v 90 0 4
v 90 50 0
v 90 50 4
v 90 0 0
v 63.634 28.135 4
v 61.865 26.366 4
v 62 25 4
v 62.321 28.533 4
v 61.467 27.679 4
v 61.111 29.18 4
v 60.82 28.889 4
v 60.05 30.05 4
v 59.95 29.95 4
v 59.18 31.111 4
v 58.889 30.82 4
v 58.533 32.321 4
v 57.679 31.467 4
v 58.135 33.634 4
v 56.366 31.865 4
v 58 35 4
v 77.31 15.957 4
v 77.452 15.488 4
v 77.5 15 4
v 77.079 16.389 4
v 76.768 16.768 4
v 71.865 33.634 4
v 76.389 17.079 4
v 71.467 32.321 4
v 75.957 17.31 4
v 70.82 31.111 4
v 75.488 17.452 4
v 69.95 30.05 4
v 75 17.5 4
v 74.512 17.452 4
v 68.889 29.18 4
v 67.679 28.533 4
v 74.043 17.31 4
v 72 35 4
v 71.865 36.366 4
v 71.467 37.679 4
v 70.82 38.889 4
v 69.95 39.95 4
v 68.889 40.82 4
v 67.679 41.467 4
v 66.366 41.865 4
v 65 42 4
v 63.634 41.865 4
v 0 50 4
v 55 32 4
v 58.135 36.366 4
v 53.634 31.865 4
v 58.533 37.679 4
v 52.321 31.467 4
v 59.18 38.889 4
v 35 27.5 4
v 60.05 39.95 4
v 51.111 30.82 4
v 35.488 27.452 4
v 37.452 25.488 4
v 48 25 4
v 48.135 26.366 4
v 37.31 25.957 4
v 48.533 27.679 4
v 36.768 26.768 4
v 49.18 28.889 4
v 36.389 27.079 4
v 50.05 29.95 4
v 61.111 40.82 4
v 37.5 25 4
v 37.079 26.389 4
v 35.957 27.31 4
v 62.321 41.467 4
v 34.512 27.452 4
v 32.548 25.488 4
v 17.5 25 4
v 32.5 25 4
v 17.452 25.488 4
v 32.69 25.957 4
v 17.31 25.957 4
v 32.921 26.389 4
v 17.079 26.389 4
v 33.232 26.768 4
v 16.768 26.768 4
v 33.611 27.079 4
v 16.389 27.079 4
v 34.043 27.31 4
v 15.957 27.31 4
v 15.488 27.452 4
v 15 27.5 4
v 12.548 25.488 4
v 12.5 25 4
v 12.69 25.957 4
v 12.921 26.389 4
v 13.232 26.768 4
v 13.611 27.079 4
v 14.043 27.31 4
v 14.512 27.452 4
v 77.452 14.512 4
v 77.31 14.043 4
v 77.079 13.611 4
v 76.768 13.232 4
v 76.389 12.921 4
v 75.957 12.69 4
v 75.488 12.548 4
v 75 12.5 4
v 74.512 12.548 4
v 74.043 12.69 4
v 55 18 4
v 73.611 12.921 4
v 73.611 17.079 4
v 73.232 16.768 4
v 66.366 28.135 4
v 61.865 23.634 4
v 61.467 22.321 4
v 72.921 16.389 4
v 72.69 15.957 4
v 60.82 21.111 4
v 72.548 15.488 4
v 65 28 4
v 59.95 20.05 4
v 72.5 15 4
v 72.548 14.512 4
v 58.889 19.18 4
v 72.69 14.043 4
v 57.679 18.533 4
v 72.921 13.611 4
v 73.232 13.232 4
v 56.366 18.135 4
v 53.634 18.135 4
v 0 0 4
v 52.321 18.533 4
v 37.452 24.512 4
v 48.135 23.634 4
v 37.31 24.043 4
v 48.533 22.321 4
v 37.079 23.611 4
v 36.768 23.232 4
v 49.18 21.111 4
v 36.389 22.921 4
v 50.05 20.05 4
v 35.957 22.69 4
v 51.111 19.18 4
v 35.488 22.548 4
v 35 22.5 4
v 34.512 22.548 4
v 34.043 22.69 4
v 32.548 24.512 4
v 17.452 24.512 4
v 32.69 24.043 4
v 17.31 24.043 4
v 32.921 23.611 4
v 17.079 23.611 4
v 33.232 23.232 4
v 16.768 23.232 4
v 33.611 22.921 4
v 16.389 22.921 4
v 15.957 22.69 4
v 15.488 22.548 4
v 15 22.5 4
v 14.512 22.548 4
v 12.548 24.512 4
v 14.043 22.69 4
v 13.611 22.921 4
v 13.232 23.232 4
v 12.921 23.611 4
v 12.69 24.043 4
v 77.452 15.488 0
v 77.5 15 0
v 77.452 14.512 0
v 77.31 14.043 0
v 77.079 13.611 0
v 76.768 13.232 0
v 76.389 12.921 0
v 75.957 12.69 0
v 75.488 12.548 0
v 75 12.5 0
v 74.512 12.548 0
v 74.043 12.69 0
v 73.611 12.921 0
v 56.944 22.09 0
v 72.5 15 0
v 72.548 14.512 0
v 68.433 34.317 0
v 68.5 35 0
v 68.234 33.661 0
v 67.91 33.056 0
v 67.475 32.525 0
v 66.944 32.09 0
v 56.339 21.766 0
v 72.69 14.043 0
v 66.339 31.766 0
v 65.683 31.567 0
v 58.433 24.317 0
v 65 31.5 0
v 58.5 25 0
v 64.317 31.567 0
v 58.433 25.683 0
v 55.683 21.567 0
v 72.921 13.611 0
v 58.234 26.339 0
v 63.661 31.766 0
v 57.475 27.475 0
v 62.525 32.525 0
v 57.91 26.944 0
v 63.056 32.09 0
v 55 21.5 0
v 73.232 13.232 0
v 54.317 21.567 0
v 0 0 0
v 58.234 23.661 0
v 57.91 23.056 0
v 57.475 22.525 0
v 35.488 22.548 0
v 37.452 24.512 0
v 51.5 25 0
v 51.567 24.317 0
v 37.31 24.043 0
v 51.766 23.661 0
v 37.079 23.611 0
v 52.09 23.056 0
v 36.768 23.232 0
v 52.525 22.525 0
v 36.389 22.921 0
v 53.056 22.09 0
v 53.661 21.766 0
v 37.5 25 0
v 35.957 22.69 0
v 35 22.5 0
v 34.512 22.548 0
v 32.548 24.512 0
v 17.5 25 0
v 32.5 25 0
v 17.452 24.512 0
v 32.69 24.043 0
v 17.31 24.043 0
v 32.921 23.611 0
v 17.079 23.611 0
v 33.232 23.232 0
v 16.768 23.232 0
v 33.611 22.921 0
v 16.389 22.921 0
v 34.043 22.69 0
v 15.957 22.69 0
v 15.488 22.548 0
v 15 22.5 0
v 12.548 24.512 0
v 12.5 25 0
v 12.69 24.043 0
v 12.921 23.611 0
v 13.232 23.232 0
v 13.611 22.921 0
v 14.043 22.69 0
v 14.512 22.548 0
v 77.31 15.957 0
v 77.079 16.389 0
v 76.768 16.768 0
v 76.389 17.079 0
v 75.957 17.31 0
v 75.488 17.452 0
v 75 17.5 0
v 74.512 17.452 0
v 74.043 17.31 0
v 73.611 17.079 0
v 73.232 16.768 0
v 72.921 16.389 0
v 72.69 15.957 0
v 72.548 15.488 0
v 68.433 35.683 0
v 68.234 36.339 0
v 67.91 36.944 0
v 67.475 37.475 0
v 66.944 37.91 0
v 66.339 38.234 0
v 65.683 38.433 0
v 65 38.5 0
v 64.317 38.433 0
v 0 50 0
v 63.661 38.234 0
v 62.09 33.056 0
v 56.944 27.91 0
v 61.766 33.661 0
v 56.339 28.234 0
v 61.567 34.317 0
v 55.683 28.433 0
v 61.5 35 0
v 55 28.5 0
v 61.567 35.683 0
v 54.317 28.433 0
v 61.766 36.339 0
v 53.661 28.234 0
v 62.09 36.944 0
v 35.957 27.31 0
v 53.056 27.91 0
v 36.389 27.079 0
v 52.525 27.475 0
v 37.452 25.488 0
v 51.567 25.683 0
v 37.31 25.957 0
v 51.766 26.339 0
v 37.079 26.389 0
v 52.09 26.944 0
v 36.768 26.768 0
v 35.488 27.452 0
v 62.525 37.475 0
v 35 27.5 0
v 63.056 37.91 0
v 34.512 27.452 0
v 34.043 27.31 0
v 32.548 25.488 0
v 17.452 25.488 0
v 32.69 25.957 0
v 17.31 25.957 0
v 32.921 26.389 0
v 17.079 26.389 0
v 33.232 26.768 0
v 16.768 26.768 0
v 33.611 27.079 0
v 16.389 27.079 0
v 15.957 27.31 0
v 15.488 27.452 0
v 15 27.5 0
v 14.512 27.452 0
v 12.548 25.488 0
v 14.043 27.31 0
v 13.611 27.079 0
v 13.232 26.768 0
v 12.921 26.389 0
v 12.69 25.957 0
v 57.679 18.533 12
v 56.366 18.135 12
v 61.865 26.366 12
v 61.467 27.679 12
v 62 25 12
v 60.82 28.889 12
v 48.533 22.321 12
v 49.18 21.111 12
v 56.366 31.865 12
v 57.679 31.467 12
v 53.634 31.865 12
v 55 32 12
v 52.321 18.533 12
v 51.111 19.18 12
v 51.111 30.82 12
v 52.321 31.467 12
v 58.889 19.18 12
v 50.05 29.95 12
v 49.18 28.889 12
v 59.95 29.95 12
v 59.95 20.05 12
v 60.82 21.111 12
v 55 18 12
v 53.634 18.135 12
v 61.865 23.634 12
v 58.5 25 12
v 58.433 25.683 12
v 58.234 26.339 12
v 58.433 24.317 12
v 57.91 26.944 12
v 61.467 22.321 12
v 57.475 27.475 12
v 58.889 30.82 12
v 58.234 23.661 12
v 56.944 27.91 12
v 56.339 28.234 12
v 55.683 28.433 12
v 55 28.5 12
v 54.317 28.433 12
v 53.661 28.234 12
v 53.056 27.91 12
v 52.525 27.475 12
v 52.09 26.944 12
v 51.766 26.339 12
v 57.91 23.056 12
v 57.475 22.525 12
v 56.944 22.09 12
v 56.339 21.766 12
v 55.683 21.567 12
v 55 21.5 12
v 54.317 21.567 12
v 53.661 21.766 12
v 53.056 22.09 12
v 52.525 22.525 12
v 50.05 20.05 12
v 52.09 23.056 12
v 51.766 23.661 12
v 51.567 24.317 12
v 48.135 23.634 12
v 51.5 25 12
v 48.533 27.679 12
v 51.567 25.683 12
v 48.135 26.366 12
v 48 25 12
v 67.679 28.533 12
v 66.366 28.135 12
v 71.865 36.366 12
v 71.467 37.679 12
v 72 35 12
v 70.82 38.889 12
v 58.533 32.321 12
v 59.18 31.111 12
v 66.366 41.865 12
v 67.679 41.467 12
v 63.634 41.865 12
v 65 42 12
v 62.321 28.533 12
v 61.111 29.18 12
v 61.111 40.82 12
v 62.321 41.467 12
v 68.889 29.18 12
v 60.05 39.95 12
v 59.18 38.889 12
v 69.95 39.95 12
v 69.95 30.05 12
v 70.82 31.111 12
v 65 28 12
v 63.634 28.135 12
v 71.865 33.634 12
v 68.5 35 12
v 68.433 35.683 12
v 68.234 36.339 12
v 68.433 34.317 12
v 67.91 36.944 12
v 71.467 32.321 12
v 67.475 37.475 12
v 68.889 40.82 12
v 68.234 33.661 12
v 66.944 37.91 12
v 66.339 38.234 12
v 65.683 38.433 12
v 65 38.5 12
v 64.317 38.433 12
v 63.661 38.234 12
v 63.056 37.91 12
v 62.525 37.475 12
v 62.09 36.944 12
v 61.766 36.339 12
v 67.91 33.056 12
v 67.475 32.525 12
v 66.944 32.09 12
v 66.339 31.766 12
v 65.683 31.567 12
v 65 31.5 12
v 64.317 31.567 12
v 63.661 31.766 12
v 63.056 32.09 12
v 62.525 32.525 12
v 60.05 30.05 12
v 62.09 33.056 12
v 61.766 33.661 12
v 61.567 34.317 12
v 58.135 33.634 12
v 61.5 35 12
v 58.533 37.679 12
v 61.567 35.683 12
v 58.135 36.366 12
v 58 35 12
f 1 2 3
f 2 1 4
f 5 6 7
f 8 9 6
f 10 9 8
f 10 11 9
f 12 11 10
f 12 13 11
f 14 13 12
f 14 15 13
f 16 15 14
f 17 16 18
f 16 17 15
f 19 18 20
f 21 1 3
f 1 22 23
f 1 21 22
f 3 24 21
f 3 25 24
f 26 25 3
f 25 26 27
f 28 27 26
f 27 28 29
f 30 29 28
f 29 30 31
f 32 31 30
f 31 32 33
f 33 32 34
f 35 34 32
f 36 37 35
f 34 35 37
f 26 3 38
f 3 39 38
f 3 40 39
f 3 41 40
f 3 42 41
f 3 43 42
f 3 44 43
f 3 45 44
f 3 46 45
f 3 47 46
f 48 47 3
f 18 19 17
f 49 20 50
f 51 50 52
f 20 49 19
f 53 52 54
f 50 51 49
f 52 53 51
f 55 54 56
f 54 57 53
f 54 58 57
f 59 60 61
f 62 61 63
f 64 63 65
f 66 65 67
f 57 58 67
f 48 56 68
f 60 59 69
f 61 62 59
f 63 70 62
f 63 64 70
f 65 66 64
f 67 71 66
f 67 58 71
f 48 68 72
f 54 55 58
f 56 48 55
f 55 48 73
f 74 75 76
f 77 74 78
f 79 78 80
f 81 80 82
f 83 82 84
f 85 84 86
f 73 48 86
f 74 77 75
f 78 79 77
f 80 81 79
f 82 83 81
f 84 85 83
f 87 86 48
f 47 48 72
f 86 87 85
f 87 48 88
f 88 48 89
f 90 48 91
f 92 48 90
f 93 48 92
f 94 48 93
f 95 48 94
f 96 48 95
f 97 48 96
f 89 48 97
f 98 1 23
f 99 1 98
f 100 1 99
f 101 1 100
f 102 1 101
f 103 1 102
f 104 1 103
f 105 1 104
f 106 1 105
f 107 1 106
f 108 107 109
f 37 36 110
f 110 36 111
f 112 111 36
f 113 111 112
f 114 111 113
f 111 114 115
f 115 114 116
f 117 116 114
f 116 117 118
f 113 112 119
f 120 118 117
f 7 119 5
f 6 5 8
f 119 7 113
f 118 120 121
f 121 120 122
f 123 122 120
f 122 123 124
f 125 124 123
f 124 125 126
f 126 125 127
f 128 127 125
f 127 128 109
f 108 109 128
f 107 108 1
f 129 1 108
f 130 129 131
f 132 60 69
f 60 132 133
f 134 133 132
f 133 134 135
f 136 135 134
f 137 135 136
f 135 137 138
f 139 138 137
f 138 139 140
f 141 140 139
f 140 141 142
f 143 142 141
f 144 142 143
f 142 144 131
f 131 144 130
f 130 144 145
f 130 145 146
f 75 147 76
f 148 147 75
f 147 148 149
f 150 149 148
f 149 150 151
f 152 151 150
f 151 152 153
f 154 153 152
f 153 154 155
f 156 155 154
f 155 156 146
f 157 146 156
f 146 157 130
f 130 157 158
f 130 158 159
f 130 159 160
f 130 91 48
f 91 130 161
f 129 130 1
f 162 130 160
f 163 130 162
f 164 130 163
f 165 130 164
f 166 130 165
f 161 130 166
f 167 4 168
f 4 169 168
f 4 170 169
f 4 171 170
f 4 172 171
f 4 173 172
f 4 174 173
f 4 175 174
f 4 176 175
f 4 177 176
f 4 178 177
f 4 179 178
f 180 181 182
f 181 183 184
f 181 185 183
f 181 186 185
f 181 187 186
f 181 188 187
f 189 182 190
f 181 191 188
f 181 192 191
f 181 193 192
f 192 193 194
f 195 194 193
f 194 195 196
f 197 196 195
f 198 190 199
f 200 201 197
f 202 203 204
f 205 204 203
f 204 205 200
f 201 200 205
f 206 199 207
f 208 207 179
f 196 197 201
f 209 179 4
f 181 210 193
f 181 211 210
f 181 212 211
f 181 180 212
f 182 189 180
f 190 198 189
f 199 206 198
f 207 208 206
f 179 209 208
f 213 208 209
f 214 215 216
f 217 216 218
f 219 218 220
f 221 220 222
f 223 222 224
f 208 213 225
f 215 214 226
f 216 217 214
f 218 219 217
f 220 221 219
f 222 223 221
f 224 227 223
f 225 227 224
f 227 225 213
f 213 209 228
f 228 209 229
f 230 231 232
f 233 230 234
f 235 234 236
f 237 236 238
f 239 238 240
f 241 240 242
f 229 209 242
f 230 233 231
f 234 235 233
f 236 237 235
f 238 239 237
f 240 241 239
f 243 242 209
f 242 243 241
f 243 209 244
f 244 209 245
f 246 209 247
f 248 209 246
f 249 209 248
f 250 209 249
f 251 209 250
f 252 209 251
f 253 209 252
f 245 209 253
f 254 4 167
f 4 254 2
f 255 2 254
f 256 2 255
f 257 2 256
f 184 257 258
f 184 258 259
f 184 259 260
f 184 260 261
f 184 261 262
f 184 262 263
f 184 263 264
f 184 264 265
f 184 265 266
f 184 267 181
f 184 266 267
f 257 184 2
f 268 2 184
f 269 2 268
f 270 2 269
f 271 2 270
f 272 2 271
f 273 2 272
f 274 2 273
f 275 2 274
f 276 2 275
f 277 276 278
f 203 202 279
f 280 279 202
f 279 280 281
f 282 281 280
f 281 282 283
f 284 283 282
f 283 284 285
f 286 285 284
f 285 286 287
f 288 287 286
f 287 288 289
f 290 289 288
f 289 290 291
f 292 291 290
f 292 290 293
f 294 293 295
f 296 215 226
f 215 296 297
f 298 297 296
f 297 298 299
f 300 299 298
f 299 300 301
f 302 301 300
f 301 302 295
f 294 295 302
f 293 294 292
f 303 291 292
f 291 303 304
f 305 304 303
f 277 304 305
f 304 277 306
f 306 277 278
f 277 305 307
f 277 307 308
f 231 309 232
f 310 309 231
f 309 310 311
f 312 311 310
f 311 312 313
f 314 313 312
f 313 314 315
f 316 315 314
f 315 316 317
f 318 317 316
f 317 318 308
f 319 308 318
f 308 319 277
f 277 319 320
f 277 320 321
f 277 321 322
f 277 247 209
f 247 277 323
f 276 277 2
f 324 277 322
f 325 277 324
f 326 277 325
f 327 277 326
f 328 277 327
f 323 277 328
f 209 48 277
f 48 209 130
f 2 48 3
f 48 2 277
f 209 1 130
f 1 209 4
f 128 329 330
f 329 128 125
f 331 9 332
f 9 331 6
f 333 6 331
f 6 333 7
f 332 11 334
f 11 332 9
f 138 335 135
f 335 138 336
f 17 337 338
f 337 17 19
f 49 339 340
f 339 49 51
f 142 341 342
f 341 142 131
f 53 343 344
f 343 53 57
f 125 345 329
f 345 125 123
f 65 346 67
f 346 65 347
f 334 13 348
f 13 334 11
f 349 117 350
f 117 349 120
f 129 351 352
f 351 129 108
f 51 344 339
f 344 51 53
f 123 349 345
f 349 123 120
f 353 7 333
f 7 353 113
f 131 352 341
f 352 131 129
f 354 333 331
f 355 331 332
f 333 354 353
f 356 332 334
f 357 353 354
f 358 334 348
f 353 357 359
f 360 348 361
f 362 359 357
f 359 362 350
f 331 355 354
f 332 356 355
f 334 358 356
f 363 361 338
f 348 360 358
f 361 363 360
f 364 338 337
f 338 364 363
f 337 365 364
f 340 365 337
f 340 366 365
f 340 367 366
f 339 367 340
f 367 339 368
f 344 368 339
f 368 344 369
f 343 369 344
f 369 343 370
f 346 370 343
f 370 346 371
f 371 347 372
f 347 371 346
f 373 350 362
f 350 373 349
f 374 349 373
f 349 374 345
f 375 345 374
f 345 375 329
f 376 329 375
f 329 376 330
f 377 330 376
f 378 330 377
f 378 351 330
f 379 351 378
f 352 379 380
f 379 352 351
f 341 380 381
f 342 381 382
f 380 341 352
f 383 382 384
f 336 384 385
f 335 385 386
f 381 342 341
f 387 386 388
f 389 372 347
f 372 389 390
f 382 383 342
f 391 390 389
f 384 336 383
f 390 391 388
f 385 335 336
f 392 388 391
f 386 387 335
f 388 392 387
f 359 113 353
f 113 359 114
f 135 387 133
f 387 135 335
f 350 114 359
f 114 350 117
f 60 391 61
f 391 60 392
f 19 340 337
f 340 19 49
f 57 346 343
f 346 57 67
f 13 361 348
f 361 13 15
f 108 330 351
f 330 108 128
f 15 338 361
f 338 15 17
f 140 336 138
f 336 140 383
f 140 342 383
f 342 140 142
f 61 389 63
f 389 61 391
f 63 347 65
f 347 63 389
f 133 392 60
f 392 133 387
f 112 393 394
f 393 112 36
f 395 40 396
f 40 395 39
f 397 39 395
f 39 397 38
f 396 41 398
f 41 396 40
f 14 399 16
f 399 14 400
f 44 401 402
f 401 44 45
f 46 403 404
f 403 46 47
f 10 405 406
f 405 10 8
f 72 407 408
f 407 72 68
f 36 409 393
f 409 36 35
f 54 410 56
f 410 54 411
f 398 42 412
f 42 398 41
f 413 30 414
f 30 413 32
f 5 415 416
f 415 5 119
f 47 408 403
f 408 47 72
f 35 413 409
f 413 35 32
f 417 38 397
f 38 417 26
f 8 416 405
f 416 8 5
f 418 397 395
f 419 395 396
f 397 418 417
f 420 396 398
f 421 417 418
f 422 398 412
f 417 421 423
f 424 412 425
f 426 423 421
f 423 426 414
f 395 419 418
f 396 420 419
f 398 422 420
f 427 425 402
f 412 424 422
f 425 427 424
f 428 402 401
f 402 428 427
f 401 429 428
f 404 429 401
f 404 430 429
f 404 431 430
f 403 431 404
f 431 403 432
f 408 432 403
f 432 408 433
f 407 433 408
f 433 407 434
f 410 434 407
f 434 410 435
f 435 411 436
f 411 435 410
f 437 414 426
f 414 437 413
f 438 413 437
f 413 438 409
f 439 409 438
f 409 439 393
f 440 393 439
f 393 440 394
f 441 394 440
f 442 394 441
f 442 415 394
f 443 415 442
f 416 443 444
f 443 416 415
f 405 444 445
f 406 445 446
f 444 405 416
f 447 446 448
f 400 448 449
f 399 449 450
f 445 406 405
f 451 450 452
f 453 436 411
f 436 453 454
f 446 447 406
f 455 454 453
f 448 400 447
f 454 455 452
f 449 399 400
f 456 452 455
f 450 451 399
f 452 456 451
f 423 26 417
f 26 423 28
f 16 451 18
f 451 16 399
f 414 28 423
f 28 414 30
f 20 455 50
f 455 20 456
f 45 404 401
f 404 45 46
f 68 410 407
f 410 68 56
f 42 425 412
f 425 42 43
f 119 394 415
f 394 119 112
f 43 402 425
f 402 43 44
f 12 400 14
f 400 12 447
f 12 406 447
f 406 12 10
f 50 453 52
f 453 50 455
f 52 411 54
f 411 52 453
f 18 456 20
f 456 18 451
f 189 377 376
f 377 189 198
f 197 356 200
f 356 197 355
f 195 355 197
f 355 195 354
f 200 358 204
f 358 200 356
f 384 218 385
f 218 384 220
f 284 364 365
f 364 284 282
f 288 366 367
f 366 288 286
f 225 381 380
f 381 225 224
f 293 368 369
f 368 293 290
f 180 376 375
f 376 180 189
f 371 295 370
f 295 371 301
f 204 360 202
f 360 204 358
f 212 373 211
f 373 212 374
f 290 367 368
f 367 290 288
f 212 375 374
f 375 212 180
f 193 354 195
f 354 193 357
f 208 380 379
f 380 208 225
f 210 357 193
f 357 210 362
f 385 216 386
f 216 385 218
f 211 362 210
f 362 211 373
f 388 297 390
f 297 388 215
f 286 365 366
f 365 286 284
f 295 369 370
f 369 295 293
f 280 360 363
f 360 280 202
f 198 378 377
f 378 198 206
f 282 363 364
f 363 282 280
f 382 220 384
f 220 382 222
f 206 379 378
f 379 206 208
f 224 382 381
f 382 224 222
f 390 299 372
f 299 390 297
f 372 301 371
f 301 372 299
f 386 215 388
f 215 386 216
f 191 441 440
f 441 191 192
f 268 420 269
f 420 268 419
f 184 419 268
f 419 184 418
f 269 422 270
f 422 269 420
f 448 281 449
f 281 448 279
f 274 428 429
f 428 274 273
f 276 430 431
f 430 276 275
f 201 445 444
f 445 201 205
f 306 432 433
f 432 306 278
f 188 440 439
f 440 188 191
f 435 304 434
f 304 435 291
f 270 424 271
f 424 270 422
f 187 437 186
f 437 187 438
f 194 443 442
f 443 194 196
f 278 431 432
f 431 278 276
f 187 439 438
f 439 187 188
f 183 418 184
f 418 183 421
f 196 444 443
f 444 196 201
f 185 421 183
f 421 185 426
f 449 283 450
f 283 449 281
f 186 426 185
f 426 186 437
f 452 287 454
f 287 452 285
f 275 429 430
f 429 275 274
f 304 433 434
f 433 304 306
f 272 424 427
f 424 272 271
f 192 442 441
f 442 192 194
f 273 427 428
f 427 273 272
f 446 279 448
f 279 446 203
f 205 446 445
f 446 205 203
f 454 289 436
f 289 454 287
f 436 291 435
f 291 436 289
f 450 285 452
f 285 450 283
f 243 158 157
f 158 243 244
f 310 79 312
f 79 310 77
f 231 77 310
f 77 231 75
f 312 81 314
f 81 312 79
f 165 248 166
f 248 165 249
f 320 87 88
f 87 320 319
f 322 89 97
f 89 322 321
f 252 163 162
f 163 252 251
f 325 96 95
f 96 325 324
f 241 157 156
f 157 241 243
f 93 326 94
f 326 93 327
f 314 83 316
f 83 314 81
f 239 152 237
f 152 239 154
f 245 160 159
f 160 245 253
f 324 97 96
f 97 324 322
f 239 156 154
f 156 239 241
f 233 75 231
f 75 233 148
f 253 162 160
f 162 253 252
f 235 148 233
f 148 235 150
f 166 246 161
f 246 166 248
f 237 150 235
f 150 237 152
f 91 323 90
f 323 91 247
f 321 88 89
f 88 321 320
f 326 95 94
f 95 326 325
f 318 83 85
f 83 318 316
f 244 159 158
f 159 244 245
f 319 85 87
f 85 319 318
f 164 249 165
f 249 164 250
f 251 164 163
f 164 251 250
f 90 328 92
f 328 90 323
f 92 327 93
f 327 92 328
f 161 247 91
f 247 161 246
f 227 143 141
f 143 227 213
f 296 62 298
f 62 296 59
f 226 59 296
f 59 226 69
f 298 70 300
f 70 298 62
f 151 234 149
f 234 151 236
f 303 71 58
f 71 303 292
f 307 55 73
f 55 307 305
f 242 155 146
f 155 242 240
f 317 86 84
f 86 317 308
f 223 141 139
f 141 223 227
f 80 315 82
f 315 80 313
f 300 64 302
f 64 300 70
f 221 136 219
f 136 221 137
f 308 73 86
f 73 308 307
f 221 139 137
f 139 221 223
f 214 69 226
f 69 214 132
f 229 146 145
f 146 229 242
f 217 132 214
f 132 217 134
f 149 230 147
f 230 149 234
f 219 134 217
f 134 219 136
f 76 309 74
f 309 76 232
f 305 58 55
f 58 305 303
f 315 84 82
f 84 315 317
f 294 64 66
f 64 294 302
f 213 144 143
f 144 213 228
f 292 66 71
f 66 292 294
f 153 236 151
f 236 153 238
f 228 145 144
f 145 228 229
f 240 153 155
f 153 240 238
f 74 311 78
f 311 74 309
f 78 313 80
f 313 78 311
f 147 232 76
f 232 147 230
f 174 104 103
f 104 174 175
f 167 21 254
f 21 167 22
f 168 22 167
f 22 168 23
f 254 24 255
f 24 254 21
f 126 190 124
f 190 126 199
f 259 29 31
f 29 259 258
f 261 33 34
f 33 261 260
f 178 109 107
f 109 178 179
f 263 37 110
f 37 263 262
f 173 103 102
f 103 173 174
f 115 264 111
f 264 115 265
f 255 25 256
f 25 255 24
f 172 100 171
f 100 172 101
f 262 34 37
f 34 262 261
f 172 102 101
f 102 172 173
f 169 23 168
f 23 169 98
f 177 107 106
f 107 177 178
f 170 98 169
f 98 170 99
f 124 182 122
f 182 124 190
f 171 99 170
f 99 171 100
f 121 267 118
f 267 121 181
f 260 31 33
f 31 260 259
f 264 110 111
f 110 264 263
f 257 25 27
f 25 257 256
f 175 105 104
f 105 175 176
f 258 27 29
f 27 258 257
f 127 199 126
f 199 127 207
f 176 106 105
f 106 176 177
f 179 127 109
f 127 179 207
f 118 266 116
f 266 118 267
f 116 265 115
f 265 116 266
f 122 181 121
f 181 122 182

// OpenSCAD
$fn = 32;

// ----------------------------------------------------------------------
// Mixed field: bosses and holes at given coordinates
// ----------------------------------------------------------------------

// --- parameters (mm) ---
plate_l = 90;             // plate length, X
plate_w = 50;             // plate width, Y
plate_t = 4;              // plate thickness, Z
boss_d = 14;              // boss diameter
boss_h = 8;               // boss height above the plate
hole_d = 5;               // through hole diameter
fit_tol = 0.02;           // tolerance for press fits, mm
free_tol = 0.2;           // tolerance for clearance fits, mm

total_h = plate_t + boss_h;  // overall height

difference() {
  union() {
    cube([plate_l, plate_w, plate_t]);
    translate([55, 25, plate_t]) cylinder(h = boss_h, d = boss_d);
    translate([65, 35, plate_t]) cylinder(h = boss_h, d = boss_d);
  }
  translate([55, 25, -1]) cylinder(h = total_h + 2, d = boss_d / 2);
  translate([65, 35, -1]) cylinder(h = total_h + 2, d = boss_d / 2);
  translate([15, 25, -1]) cylinder(h = plate_t + 2, d = hole_d);
  translate([35, 25, -1]) cylinder(h = plate_t + 2, d = hole_d);
  translate([75, 15, -1]) cylinder(h = plate_t + 2, d = hole_d);
}
